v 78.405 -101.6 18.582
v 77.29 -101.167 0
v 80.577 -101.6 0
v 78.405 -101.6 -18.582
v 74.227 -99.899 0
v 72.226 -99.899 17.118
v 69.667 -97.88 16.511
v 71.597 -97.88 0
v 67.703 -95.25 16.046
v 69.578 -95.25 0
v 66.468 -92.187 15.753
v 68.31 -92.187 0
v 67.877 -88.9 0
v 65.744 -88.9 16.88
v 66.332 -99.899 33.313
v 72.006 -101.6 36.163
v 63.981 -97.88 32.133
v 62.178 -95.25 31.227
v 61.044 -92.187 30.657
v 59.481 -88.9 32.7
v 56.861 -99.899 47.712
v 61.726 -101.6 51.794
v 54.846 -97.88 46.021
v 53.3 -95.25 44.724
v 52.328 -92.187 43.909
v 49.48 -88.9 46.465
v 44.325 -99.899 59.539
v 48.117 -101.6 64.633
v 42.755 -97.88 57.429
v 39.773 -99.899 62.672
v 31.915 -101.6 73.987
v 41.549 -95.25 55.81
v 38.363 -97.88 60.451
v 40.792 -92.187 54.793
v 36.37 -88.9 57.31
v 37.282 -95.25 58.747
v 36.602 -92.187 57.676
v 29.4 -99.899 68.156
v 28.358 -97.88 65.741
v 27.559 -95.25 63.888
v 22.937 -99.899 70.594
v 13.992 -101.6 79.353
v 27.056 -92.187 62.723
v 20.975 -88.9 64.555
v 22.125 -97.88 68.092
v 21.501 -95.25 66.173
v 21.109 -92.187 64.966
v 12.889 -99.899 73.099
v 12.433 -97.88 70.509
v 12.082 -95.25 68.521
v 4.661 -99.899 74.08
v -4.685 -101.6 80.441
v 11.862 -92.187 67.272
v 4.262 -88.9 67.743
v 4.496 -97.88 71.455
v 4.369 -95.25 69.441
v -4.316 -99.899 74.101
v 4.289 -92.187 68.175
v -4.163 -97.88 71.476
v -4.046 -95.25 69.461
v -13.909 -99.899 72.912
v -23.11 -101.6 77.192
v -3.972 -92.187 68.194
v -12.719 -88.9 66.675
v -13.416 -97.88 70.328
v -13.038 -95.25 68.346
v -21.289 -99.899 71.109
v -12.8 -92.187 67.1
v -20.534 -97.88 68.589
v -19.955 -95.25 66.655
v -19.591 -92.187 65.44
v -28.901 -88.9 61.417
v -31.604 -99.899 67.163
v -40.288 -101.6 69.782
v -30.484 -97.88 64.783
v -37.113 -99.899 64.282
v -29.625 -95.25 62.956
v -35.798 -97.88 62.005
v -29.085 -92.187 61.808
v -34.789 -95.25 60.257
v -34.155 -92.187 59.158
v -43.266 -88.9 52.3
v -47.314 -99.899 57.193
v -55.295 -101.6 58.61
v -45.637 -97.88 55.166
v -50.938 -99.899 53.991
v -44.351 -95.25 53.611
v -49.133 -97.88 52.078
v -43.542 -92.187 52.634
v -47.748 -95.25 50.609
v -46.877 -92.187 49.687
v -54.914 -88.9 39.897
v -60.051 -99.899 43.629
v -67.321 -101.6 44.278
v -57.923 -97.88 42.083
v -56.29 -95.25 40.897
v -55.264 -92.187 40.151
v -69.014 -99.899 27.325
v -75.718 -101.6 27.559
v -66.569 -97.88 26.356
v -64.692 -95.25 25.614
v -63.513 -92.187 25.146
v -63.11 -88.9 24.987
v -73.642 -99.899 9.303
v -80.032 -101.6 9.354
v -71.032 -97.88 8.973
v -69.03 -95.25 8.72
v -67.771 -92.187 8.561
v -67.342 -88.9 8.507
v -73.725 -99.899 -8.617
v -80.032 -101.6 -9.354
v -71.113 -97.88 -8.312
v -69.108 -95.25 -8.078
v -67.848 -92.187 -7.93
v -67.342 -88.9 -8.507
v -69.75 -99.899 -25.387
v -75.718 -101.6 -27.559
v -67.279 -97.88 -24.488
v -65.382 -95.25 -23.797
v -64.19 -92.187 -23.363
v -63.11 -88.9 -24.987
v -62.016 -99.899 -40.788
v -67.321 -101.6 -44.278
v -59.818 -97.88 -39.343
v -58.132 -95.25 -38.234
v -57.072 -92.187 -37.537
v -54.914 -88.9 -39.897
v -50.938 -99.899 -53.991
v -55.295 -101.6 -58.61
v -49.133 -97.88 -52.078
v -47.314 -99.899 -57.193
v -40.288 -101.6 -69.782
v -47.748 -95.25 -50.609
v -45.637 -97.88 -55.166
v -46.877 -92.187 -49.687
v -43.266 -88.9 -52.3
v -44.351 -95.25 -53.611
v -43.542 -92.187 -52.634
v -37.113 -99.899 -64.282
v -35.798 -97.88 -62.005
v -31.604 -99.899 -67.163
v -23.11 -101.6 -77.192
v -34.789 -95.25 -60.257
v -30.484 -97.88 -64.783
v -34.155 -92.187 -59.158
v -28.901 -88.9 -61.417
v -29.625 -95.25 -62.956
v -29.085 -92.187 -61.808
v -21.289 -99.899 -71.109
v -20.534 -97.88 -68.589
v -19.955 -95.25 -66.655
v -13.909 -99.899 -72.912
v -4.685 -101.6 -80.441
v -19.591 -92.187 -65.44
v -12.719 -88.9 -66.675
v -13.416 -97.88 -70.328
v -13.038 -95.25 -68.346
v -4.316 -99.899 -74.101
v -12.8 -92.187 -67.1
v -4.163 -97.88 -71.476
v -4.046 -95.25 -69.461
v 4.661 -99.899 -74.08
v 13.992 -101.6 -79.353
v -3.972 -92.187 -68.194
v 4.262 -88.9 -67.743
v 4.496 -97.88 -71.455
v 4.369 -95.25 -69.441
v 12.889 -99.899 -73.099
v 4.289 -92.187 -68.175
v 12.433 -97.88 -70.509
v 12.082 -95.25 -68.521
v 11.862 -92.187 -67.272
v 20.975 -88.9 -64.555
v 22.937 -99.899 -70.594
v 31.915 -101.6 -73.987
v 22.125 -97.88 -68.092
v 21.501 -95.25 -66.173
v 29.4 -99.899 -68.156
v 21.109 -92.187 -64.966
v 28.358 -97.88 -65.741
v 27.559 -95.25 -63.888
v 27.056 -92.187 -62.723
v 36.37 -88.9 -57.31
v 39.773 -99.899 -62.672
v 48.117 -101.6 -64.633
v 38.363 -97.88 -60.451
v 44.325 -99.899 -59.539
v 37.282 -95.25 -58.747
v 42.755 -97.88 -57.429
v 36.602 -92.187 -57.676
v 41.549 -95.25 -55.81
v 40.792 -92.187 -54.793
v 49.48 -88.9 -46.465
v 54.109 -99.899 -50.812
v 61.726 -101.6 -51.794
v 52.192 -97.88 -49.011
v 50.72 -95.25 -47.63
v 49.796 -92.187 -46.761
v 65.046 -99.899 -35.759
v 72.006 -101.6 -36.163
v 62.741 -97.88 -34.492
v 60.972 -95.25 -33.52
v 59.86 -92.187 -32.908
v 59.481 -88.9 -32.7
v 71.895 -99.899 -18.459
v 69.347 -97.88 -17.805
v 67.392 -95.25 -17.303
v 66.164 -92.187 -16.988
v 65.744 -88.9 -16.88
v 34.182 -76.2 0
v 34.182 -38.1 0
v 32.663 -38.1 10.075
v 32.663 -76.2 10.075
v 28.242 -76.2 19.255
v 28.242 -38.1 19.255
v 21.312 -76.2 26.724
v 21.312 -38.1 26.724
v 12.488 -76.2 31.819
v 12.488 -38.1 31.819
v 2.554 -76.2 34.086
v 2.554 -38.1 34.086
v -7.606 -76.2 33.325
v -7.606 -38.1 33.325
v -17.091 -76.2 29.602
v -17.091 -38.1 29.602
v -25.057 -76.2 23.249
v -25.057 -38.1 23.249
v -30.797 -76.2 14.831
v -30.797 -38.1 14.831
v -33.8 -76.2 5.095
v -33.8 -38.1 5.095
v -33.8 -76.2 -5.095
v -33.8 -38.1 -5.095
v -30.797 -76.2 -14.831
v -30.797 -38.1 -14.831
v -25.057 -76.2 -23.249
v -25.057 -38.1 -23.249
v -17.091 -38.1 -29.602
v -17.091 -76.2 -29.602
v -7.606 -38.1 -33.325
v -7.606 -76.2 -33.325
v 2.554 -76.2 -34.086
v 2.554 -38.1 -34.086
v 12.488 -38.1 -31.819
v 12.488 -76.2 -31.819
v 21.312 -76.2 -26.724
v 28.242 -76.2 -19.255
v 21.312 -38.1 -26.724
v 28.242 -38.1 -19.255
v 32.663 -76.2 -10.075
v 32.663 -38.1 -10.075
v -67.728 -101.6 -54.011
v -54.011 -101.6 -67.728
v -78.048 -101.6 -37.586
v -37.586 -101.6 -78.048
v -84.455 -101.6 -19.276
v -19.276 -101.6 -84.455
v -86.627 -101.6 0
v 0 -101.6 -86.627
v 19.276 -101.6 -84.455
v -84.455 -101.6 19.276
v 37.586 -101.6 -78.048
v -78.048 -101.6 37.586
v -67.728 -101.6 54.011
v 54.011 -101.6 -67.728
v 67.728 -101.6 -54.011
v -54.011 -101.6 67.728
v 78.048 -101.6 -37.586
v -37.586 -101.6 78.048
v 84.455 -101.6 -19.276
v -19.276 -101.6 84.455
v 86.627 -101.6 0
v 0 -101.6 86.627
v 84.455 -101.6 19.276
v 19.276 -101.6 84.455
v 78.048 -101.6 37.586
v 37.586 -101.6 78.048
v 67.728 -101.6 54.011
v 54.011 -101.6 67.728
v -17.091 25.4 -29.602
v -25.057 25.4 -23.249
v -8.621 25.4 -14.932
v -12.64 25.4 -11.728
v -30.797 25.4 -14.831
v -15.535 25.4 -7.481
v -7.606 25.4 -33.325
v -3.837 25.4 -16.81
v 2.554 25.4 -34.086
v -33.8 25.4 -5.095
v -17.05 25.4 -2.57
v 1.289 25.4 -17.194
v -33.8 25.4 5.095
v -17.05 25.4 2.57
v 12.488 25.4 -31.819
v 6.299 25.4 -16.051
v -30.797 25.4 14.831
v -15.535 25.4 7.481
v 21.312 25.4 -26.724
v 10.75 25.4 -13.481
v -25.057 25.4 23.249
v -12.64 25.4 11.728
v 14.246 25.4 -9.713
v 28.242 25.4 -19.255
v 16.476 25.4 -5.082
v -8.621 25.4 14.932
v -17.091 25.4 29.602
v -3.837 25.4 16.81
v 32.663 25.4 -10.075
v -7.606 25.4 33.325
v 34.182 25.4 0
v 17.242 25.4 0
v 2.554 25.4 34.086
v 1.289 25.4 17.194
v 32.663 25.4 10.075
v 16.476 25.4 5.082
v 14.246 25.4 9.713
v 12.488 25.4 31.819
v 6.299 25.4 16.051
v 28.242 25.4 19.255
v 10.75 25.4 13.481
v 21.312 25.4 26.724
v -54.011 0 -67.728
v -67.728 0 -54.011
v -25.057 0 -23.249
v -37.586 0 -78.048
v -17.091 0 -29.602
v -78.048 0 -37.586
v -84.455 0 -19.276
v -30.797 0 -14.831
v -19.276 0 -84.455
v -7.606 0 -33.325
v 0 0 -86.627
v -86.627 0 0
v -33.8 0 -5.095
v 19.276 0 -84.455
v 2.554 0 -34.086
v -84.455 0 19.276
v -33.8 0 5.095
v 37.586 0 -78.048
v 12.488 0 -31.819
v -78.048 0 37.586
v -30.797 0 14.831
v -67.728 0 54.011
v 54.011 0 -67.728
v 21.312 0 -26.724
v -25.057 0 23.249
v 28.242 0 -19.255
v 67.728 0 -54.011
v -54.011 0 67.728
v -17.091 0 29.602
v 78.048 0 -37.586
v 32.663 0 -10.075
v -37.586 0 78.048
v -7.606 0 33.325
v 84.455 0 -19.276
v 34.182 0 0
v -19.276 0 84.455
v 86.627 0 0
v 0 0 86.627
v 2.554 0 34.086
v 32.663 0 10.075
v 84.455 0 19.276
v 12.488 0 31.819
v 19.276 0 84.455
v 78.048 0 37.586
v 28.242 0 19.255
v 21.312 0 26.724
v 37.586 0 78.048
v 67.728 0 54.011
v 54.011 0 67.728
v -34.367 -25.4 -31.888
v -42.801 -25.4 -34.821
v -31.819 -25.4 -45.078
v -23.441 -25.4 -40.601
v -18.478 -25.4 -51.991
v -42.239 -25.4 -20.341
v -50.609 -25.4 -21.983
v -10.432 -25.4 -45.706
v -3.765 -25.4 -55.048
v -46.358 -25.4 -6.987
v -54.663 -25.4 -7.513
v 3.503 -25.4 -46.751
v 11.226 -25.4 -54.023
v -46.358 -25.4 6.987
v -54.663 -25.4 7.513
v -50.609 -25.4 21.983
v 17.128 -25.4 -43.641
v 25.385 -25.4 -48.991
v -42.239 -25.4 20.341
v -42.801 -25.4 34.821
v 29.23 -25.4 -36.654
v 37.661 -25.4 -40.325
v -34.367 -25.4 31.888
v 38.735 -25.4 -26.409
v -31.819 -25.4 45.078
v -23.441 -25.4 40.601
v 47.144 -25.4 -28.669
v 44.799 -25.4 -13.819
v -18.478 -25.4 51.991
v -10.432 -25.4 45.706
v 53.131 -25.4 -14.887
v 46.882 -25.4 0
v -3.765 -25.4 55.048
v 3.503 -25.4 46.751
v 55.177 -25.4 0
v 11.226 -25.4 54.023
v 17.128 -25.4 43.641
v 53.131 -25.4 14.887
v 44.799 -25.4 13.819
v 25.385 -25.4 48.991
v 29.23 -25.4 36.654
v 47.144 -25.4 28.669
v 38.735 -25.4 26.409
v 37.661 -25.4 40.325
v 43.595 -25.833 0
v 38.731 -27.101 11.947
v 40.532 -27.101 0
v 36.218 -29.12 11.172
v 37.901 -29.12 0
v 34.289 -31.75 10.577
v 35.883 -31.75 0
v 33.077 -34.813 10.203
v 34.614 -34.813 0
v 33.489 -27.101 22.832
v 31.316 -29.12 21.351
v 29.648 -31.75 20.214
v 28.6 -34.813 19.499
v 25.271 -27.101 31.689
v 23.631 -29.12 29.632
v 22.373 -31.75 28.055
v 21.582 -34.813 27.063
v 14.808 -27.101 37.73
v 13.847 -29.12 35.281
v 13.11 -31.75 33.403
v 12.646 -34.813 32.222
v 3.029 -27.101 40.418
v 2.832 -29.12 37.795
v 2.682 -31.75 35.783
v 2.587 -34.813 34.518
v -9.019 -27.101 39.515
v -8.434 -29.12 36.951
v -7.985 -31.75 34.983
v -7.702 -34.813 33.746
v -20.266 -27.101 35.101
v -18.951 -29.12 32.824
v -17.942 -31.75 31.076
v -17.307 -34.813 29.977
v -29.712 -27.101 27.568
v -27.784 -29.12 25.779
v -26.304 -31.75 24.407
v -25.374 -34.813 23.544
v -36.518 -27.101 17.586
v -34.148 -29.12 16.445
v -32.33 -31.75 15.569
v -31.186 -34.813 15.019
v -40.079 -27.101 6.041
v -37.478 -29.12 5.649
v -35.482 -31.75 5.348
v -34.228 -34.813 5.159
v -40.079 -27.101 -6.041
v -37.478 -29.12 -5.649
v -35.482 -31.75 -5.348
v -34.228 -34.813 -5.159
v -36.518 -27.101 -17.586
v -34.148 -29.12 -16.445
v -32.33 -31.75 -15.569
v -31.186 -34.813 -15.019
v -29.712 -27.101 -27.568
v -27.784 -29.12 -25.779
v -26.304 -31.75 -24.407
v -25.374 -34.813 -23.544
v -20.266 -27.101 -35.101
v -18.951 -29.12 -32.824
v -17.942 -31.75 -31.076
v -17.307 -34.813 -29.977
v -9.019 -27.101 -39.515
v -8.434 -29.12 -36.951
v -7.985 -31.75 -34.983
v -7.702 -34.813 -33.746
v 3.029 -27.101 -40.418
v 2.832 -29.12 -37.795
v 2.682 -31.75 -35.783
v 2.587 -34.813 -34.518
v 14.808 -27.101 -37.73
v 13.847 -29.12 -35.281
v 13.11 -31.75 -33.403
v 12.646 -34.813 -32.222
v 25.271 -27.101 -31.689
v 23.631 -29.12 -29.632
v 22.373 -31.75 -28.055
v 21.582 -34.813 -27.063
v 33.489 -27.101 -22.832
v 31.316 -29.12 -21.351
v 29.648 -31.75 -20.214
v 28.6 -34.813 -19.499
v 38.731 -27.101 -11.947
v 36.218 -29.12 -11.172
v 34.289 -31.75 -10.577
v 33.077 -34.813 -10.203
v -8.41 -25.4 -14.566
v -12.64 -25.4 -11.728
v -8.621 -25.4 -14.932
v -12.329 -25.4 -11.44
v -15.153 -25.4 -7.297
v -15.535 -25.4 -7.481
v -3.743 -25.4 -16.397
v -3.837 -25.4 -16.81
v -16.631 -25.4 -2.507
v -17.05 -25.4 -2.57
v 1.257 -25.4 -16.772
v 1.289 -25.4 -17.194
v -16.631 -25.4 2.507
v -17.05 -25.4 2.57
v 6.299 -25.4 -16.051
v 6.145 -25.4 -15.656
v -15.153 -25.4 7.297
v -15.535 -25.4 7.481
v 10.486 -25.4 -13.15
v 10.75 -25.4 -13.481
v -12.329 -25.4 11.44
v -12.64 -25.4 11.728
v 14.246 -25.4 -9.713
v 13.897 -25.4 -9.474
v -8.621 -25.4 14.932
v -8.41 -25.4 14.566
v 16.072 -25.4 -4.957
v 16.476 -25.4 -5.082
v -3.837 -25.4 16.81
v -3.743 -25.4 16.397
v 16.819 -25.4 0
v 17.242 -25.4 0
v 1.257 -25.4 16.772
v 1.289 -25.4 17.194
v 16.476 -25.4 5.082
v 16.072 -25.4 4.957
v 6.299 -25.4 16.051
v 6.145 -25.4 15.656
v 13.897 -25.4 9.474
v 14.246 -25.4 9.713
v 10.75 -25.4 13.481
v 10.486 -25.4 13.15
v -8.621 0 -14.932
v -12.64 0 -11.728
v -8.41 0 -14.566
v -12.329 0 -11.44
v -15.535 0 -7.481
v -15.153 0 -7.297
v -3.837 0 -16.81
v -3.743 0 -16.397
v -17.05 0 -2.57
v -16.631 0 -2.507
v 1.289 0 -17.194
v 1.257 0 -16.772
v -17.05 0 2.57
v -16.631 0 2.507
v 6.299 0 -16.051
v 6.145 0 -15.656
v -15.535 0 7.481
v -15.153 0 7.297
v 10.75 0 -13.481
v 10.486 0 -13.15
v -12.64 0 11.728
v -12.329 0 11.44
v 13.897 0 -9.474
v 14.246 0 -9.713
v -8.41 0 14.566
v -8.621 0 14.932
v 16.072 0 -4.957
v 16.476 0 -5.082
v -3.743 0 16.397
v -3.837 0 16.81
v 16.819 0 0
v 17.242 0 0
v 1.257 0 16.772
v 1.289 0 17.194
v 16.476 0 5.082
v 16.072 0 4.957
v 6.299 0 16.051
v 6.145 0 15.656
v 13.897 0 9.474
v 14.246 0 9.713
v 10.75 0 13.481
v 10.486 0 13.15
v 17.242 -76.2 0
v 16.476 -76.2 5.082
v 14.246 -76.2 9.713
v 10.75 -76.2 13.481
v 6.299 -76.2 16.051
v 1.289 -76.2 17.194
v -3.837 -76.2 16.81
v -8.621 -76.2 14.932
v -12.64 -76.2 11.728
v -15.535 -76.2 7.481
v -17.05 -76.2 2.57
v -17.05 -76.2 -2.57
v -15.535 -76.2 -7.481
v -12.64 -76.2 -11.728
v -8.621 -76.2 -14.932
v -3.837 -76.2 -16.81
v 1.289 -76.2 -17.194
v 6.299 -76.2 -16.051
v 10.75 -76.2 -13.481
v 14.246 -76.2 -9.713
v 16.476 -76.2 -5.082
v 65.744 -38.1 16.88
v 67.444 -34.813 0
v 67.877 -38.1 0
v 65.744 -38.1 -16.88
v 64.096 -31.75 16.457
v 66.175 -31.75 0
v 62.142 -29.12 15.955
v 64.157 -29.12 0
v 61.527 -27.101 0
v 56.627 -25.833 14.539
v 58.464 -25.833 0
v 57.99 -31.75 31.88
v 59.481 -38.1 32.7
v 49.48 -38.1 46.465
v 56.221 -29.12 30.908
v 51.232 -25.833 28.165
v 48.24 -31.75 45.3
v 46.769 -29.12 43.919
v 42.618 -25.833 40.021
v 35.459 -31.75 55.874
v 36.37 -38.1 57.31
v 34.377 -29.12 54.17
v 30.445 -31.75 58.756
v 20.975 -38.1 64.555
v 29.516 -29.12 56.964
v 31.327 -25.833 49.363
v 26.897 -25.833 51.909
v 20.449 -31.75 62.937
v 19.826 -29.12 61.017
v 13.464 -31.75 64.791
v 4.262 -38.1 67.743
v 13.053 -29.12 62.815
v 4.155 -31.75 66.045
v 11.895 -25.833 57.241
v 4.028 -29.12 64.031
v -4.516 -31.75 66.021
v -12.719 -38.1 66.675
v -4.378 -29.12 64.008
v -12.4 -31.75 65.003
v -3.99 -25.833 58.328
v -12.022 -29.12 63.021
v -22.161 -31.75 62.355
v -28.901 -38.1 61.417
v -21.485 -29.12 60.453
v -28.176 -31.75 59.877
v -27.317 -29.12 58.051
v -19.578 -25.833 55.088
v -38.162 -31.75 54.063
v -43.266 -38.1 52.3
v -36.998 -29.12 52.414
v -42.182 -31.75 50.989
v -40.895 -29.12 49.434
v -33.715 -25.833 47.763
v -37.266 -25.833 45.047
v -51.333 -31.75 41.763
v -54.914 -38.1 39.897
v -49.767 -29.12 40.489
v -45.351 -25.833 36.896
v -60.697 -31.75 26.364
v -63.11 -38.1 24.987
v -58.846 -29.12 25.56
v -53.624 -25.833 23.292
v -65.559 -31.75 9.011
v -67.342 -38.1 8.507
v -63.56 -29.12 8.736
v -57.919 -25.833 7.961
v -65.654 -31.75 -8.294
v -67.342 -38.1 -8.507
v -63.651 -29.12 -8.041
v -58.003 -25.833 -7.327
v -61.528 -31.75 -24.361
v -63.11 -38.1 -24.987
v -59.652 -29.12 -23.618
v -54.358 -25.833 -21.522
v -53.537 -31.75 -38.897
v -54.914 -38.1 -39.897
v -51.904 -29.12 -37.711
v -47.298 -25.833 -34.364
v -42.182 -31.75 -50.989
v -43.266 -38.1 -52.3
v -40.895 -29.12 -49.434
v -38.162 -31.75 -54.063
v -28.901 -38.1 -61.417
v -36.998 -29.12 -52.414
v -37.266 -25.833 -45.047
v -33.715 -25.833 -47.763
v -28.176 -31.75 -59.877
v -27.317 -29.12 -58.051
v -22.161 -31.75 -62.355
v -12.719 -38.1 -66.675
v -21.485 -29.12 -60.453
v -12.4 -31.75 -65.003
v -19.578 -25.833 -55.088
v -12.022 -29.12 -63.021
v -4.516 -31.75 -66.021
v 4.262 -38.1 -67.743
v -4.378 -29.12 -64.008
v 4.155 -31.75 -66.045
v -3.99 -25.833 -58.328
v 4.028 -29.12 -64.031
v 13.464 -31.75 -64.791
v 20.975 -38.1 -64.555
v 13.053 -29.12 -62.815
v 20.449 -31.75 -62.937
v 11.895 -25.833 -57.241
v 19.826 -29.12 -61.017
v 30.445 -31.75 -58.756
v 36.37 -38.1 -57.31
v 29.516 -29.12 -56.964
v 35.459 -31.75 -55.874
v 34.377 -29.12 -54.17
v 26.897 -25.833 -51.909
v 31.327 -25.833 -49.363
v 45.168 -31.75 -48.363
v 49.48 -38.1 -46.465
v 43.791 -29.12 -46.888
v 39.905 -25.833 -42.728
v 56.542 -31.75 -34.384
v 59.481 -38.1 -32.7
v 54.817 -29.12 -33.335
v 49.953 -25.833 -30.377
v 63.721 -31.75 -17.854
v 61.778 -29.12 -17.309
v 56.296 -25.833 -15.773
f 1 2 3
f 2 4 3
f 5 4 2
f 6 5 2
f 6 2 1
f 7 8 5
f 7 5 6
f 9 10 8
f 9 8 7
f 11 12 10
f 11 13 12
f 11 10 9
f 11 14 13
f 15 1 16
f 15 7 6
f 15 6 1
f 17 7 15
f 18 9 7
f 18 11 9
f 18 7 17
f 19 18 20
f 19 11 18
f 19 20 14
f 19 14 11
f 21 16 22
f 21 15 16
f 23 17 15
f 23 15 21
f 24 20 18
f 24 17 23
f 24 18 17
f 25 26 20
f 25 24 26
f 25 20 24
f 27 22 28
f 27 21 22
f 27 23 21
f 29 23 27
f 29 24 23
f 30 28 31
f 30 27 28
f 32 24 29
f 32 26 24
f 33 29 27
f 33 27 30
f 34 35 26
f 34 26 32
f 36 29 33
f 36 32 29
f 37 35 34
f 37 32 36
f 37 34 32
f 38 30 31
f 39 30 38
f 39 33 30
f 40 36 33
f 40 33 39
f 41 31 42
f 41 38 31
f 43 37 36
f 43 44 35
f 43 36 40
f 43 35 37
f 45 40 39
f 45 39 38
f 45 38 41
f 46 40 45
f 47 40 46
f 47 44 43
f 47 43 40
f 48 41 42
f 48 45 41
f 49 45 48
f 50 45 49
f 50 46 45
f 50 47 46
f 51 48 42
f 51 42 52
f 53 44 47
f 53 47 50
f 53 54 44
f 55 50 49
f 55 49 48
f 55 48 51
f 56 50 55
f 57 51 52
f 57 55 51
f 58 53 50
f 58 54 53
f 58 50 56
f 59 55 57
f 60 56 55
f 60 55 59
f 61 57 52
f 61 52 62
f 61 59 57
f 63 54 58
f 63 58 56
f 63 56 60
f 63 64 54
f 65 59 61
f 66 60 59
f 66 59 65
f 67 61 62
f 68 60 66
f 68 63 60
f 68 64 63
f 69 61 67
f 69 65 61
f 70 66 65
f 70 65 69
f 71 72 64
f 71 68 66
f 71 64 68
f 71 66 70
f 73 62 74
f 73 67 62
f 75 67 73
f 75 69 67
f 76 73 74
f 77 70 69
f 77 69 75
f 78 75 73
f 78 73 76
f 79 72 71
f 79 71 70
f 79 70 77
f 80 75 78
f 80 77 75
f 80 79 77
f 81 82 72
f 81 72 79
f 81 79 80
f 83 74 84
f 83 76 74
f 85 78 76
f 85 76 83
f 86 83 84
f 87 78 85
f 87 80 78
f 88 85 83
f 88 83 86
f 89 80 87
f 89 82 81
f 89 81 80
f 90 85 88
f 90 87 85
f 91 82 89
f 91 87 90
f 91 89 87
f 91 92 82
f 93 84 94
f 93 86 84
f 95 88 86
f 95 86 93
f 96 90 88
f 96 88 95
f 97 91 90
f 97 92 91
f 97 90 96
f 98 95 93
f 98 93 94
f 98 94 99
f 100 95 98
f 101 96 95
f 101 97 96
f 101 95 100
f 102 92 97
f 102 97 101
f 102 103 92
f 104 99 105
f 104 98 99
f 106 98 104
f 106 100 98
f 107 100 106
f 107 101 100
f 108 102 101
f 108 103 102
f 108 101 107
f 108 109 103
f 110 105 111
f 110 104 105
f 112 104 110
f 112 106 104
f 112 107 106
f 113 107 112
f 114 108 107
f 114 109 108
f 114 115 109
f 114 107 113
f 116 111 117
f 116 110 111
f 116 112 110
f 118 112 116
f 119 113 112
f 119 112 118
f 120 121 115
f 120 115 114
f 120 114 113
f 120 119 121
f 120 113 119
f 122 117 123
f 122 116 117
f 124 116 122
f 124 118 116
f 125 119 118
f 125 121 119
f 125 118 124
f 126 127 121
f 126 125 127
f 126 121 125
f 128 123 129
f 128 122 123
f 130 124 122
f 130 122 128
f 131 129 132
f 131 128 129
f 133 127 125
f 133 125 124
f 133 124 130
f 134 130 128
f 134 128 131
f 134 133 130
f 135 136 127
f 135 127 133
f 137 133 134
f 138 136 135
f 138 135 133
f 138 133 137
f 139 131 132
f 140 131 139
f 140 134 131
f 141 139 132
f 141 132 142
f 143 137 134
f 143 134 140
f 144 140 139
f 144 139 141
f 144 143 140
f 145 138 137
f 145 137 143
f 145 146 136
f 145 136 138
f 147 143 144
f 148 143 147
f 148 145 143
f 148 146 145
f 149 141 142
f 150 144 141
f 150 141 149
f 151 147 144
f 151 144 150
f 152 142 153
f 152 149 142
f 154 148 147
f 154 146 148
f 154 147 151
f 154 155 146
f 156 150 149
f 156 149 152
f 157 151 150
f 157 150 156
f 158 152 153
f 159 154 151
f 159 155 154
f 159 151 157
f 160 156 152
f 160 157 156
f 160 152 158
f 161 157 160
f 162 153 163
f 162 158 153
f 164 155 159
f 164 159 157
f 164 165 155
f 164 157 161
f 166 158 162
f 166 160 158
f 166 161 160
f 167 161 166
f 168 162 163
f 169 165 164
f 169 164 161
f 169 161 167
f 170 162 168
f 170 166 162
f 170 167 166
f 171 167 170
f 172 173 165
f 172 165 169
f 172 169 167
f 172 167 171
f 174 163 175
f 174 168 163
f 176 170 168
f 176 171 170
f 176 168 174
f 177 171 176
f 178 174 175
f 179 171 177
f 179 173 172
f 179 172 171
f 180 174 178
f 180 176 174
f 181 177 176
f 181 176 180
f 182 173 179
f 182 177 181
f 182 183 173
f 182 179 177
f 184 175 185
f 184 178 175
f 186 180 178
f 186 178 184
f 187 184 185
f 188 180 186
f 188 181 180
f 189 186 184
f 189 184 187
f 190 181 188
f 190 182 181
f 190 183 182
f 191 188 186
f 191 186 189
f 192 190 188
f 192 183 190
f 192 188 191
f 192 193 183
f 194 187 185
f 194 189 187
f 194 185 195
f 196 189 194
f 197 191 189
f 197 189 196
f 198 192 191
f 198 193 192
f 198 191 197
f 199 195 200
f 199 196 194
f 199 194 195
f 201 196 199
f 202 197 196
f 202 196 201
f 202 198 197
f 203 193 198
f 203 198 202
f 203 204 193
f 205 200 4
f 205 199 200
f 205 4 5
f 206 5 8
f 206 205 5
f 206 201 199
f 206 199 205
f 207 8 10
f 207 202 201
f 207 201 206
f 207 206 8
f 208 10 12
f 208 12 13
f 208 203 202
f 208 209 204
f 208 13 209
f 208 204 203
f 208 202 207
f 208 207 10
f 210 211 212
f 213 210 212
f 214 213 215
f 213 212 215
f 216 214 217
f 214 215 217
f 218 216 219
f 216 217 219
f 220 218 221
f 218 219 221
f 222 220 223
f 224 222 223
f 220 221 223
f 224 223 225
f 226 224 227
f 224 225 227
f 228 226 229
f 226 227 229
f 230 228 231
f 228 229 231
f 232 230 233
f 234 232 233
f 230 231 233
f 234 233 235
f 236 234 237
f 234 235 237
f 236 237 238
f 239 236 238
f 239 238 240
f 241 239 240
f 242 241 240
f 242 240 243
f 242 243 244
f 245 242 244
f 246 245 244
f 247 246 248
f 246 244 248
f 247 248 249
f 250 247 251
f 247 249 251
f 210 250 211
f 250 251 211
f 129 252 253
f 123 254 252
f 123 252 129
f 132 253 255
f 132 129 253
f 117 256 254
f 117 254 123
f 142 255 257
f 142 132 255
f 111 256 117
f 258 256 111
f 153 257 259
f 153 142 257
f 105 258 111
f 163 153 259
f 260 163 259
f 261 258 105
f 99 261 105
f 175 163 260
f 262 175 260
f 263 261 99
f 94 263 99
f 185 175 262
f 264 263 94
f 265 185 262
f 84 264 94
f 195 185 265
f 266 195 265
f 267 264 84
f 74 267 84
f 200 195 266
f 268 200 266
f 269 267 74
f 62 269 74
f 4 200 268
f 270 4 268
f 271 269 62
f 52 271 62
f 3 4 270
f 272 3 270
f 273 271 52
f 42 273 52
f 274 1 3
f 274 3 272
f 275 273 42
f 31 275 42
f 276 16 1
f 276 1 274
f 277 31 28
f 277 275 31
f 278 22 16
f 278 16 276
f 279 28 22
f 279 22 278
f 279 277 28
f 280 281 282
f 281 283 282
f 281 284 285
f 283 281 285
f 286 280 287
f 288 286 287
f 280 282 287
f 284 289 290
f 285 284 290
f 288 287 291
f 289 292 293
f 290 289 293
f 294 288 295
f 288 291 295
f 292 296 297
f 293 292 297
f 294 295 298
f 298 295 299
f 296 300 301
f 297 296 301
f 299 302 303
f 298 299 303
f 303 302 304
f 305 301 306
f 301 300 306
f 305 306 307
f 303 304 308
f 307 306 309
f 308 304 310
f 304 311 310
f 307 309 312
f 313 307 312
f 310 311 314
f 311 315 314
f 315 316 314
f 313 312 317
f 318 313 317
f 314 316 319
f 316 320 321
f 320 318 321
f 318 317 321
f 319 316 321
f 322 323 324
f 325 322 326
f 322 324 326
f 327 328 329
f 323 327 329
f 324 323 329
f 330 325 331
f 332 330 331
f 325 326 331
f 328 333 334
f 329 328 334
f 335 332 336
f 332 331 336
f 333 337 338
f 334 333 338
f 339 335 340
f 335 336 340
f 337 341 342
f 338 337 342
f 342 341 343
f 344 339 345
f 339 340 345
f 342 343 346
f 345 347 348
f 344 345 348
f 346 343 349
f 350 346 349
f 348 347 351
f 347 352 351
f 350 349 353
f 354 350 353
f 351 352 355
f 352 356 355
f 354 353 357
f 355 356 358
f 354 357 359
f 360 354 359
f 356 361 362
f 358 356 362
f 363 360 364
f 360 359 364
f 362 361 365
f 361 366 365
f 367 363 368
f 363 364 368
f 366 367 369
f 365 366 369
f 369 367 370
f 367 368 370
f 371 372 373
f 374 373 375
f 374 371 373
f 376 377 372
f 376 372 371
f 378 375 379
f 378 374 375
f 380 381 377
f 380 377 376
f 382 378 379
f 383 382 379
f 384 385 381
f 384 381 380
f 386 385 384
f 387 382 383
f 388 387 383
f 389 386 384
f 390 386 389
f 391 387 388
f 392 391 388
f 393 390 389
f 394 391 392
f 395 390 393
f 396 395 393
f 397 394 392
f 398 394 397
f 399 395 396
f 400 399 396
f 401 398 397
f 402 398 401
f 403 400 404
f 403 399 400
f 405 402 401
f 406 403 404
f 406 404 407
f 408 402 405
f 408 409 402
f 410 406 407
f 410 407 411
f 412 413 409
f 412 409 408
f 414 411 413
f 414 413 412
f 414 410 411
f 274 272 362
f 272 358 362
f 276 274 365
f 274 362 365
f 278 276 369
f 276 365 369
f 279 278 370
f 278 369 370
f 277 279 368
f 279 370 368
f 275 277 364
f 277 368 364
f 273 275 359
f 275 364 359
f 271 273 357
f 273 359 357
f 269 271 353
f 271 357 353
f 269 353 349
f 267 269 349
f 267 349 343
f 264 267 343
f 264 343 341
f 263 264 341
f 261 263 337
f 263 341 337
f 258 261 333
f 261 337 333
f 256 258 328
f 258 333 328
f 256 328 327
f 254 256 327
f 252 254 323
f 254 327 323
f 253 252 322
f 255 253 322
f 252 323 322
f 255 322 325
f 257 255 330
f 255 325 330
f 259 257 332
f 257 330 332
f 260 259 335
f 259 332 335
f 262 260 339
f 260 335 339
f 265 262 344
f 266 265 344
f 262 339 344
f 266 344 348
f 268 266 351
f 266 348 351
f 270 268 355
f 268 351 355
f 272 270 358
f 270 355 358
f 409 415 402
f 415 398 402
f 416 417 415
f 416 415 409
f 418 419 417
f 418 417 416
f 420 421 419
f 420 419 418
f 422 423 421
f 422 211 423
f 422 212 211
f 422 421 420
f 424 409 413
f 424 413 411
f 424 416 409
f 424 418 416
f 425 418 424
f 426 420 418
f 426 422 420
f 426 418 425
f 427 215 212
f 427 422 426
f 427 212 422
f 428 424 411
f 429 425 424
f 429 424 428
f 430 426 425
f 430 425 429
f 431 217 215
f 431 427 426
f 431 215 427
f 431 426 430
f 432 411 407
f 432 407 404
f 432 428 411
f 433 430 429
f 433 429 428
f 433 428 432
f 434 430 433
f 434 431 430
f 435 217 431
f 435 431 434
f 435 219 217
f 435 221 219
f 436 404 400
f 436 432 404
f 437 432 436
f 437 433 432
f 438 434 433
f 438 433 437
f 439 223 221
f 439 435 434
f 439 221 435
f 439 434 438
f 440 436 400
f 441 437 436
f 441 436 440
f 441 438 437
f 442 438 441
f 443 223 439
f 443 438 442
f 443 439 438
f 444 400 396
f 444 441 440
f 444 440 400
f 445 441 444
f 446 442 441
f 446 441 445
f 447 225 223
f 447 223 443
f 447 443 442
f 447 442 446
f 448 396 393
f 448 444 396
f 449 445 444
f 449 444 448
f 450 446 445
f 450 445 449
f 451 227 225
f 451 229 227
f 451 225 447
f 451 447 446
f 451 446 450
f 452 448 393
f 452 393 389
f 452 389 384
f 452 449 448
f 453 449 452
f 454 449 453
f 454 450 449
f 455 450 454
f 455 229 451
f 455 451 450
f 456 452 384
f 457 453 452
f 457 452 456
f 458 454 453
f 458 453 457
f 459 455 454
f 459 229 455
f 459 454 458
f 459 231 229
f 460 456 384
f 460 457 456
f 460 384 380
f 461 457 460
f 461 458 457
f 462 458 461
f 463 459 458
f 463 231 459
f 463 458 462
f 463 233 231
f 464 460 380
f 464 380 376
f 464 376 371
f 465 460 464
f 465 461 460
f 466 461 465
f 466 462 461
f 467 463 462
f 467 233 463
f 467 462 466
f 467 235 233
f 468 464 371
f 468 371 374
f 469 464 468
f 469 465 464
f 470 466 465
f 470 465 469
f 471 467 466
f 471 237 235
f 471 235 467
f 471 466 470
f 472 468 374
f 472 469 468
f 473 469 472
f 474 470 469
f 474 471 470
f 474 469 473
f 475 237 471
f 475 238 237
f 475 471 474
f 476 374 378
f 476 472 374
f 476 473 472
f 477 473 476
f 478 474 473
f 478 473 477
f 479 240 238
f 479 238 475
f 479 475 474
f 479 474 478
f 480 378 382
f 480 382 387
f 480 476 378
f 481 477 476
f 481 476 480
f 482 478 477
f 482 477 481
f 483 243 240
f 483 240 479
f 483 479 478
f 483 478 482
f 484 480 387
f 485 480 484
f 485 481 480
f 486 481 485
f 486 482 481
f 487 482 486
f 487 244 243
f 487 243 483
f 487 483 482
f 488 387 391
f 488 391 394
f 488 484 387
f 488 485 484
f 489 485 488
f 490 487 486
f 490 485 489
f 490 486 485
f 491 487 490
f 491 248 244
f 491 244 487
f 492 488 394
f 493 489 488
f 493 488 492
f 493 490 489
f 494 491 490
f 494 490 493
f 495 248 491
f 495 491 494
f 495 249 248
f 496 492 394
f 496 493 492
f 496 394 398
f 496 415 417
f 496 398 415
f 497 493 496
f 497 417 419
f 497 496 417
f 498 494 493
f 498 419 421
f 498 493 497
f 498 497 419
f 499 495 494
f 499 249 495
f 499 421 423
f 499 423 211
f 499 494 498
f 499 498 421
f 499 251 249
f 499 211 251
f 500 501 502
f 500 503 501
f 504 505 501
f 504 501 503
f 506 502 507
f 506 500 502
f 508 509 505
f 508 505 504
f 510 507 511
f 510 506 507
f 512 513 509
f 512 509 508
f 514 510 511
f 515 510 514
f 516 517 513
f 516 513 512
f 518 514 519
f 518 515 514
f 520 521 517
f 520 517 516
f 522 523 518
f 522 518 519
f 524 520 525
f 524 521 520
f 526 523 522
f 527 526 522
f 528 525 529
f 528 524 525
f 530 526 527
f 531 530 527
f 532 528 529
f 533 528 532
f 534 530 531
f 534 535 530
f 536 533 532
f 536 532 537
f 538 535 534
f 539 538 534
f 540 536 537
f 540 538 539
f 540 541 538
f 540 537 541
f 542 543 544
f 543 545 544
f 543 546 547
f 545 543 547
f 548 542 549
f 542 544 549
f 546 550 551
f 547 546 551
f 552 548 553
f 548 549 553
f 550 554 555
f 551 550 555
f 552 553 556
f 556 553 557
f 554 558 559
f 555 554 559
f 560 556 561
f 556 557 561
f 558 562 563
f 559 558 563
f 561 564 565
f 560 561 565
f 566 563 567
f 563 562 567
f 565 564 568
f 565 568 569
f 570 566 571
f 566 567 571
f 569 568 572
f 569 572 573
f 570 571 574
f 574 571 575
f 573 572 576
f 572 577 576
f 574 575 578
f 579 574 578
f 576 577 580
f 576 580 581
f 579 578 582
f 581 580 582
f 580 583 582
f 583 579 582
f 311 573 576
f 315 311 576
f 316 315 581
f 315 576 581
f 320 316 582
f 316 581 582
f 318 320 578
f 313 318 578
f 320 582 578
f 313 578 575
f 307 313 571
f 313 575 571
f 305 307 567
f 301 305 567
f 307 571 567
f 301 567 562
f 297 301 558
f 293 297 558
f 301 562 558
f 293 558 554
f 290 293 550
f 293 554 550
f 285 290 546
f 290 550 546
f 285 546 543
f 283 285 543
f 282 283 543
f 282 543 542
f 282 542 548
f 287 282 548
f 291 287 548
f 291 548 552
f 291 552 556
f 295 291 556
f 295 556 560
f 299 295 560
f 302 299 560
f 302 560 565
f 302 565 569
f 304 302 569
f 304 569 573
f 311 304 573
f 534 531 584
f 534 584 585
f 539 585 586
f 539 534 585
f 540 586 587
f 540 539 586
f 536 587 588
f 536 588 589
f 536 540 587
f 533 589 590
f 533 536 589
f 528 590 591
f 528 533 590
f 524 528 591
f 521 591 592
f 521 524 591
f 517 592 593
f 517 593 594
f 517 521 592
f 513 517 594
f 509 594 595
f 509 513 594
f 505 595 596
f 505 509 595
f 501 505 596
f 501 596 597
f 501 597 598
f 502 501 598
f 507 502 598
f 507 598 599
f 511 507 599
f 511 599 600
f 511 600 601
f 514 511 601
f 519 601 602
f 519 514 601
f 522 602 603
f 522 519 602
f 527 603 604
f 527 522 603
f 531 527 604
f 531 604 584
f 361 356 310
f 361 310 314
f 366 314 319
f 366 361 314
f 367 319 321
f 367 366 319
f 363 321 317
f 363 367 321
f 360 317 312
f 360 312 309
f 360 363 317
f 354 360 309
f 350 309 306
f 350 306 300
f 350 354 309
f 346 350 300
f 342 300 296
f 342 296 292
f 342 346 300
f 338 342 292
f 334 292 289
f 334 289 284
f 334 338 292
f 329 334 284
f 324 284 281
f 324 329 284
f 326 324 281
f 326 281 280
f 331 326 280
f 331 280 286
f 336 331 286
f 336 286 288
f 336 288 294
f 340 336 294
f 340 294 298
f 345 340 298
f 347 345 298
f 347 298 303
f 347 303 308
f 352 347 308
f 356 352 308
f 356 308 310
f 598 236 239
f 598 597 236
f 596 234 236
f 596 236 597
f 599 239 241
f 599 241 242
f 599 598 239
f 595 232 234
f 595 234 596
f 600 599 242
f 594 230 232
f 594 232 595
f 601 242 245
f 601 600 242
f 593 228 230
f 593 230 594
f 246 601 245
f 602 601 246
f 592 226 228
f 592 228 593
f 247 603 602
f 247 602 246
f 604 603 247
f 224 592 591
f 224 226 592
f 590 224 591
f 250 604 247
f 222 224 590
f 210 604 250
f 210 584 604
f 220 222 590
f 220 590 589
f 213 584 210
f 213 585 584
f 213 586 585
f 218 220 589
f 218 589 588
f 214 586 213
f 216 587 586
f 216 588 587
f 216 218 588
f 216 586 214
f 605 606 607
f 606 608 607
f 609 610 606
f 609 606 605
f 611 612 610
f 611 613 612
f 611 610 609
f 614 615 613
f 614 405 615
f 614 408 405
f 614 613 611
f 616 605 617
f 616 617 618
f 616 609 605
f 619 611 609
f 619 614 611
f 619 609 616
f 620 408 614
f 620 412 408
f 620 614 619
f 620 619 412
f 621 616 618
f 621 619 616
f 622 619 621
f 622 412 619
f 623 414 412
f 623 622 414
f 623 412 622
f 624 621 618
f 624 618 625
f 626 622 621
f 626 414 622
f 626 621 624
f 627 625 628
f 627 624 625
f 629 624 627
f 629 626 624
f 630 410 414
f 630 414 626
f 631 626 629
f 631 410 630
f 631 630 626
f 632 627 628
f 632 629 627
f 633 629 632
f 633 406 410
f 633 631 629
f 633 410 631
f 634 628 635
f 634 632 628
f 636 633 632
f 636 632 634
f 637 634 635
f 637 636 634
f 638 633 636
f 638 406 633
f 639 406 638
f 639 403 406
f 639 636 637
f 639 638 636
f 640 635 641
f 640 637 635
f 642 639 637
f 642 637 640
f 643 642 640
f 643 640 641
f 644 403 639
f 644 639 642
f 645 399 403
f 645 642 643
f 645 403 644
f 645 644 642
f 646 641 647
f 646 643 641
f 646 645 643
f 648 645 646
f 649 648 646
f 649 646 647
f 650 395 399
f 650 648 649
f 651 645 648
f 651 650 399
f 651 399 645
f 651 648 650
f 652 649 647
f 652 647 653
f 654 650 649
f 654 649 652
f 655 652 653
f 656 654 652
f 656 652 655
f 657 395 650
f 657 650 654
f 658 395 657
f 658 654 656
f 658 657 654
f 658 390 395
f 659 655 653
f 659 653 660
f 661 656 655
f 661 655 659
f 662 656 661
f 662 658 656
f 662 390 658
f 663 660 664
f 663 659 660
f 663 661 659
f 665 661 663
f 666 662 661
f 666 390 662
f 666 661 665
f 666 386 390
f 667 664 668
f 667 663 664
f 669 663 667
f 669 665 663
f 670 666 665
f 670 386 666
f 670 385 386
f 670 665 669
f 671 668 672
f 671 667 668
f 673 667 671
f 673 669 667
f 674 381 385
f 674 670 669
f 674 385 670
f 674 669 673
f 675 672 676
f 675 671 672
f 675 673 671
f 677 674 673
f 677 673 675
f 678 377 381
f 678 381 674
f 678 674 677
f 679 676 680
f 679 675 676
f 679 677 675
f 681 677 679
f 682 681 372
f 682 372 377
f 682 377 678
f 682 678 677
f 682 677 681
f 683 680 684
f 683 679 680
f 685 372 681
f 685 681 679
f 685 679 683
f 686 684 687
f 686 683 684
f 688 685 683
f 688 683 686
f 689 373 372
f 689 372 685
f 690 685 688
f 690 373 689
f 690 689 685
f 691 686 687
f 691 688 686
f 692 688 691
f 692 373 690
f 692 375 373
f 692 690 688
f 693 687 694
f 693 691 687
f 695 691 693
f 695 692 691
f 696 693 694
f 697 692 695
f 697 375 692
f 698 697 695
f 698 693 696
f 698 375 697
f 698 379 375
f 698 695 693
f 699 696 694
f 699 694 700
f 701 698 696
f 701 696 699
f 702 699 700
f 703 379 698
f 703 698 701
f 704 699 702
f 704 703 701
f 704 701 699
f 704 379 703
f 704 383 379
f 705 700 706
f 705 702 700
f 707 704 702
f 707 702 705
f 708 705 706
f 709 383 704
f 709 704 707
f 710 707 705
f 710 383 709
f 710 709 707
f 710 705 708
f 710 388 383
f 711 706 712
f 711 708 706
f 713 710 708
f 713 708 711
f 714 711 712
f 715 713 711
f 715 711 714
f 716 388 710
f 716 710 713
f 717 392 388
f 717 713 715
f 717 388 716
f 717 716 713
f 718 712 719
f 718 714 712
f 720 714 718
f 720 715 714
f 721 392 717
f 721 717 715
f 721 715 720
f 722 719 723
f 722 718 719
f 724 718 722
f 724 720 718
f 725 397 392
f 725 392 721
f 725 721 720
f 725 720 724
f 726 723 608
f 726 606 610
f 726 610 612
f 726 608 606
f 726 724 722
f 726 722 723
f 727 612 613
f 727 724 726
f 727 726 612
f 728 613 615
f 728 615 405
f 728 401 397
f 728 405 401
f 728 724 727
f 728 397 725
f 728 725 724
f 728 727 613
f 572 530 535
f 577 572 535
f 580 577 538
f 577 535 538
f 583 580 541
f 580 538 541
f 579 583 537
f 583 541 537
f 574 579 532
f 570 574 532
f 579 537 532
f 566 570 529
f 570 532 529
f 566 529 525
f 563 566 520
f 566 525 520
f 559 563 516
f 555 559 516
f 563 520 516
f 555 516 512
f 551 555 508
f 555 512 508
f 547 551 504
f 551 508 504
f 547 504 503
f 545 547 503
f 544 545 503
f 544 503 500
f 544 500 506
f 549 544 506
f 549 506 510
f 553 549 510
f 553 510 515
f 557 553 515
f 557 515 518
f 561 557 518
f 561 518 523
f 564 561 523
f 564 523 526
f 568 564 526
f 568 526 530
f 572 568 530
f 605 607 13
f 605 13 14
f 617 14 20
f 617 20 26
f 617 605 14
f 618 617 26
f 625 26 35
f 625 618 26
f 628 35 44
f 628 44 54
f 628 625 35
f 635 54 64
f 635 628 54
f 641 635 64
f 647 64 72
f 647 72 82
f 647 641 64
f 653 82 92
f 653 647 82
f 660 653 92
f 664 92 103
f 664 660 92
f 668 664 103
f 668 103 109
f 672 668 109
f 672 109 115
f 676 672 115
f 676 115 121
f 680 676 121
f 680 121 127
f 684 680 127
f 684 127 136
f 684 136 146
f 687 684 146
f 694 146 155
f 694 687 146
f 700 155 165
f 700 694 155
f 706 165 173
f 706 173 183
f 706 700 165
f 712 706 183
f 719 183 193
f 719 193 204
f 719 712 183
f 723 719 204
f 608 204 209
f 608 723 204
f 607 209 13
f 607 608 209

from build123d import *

# Parameters (mm, degrees)
F0_R          = 86.6272823849
F1_DEPTH      = 25.4
F2_R          = 86.6272823849
F2_R_2        = 67.8769245924
F3_DEPTH      = 76.2
F4_R          = 34.1816109176
F4_R_2        = 17.2424518984
F5_DEPTH      = 50.8
F5_DEPTH_BACK = 50.8
F6_R          = 16.8190059926
F7_DEPTH      = 50.8
F8_R          = 12.7
F9_R          = 12.7


with BuildPart() as f1:
    # F0 (on Front) → F1 (new body)
    with BuildSketch(Plane.XZ):
        Circle(F0_R)
    extrude(amount=F1_DEPTH)

    # F2 (on face) → F3 (join)
    with BuildSketch(Plane.XZ.offset(25.4)):
        Circle(F2_R)
        Circle(F2_R_2, mode=Mode.SUBTRACT)
    extrude(amount=F3_DEPTH)

    # F4 (on face) → F5 (join, two sides)
    with BuildSketch(Plane.XZ.offset(25.4)) as f5_sk:
        Circle(F4_R)
        Circle(F4_R_2, mode=Mode.SUBTRACT)
    extrude(amount=F5_DEPTH)
    extrude(f5_sk.sketch, amount=-F5_DEPTH_BACK)

    # F6 (on face) → F7 (cut)
    with BuildSketch(Plane.XZ.offset(25.4)):
        Circle(F6_R)
    extrude(amount=-F7_DEPTH, mode=Mode.SUBTRACT)

    # F8
    f8_edges = [f1.edges().sort_by_distance(p)[0] for p in [
        (-67.876925, -101.6, 0),
    ]]
    fillet(f8_edges, radius=F8_R)

    # F9
    f9_edges = [f1.edges().sort_by_distance(p)[0] for p in [
        (-67.876925, -25.4, 0),
        (-34.181611, -25.4, 0),
    ]]
    fillet(f9_edges, radius=F9_R)


solid = f1.part
